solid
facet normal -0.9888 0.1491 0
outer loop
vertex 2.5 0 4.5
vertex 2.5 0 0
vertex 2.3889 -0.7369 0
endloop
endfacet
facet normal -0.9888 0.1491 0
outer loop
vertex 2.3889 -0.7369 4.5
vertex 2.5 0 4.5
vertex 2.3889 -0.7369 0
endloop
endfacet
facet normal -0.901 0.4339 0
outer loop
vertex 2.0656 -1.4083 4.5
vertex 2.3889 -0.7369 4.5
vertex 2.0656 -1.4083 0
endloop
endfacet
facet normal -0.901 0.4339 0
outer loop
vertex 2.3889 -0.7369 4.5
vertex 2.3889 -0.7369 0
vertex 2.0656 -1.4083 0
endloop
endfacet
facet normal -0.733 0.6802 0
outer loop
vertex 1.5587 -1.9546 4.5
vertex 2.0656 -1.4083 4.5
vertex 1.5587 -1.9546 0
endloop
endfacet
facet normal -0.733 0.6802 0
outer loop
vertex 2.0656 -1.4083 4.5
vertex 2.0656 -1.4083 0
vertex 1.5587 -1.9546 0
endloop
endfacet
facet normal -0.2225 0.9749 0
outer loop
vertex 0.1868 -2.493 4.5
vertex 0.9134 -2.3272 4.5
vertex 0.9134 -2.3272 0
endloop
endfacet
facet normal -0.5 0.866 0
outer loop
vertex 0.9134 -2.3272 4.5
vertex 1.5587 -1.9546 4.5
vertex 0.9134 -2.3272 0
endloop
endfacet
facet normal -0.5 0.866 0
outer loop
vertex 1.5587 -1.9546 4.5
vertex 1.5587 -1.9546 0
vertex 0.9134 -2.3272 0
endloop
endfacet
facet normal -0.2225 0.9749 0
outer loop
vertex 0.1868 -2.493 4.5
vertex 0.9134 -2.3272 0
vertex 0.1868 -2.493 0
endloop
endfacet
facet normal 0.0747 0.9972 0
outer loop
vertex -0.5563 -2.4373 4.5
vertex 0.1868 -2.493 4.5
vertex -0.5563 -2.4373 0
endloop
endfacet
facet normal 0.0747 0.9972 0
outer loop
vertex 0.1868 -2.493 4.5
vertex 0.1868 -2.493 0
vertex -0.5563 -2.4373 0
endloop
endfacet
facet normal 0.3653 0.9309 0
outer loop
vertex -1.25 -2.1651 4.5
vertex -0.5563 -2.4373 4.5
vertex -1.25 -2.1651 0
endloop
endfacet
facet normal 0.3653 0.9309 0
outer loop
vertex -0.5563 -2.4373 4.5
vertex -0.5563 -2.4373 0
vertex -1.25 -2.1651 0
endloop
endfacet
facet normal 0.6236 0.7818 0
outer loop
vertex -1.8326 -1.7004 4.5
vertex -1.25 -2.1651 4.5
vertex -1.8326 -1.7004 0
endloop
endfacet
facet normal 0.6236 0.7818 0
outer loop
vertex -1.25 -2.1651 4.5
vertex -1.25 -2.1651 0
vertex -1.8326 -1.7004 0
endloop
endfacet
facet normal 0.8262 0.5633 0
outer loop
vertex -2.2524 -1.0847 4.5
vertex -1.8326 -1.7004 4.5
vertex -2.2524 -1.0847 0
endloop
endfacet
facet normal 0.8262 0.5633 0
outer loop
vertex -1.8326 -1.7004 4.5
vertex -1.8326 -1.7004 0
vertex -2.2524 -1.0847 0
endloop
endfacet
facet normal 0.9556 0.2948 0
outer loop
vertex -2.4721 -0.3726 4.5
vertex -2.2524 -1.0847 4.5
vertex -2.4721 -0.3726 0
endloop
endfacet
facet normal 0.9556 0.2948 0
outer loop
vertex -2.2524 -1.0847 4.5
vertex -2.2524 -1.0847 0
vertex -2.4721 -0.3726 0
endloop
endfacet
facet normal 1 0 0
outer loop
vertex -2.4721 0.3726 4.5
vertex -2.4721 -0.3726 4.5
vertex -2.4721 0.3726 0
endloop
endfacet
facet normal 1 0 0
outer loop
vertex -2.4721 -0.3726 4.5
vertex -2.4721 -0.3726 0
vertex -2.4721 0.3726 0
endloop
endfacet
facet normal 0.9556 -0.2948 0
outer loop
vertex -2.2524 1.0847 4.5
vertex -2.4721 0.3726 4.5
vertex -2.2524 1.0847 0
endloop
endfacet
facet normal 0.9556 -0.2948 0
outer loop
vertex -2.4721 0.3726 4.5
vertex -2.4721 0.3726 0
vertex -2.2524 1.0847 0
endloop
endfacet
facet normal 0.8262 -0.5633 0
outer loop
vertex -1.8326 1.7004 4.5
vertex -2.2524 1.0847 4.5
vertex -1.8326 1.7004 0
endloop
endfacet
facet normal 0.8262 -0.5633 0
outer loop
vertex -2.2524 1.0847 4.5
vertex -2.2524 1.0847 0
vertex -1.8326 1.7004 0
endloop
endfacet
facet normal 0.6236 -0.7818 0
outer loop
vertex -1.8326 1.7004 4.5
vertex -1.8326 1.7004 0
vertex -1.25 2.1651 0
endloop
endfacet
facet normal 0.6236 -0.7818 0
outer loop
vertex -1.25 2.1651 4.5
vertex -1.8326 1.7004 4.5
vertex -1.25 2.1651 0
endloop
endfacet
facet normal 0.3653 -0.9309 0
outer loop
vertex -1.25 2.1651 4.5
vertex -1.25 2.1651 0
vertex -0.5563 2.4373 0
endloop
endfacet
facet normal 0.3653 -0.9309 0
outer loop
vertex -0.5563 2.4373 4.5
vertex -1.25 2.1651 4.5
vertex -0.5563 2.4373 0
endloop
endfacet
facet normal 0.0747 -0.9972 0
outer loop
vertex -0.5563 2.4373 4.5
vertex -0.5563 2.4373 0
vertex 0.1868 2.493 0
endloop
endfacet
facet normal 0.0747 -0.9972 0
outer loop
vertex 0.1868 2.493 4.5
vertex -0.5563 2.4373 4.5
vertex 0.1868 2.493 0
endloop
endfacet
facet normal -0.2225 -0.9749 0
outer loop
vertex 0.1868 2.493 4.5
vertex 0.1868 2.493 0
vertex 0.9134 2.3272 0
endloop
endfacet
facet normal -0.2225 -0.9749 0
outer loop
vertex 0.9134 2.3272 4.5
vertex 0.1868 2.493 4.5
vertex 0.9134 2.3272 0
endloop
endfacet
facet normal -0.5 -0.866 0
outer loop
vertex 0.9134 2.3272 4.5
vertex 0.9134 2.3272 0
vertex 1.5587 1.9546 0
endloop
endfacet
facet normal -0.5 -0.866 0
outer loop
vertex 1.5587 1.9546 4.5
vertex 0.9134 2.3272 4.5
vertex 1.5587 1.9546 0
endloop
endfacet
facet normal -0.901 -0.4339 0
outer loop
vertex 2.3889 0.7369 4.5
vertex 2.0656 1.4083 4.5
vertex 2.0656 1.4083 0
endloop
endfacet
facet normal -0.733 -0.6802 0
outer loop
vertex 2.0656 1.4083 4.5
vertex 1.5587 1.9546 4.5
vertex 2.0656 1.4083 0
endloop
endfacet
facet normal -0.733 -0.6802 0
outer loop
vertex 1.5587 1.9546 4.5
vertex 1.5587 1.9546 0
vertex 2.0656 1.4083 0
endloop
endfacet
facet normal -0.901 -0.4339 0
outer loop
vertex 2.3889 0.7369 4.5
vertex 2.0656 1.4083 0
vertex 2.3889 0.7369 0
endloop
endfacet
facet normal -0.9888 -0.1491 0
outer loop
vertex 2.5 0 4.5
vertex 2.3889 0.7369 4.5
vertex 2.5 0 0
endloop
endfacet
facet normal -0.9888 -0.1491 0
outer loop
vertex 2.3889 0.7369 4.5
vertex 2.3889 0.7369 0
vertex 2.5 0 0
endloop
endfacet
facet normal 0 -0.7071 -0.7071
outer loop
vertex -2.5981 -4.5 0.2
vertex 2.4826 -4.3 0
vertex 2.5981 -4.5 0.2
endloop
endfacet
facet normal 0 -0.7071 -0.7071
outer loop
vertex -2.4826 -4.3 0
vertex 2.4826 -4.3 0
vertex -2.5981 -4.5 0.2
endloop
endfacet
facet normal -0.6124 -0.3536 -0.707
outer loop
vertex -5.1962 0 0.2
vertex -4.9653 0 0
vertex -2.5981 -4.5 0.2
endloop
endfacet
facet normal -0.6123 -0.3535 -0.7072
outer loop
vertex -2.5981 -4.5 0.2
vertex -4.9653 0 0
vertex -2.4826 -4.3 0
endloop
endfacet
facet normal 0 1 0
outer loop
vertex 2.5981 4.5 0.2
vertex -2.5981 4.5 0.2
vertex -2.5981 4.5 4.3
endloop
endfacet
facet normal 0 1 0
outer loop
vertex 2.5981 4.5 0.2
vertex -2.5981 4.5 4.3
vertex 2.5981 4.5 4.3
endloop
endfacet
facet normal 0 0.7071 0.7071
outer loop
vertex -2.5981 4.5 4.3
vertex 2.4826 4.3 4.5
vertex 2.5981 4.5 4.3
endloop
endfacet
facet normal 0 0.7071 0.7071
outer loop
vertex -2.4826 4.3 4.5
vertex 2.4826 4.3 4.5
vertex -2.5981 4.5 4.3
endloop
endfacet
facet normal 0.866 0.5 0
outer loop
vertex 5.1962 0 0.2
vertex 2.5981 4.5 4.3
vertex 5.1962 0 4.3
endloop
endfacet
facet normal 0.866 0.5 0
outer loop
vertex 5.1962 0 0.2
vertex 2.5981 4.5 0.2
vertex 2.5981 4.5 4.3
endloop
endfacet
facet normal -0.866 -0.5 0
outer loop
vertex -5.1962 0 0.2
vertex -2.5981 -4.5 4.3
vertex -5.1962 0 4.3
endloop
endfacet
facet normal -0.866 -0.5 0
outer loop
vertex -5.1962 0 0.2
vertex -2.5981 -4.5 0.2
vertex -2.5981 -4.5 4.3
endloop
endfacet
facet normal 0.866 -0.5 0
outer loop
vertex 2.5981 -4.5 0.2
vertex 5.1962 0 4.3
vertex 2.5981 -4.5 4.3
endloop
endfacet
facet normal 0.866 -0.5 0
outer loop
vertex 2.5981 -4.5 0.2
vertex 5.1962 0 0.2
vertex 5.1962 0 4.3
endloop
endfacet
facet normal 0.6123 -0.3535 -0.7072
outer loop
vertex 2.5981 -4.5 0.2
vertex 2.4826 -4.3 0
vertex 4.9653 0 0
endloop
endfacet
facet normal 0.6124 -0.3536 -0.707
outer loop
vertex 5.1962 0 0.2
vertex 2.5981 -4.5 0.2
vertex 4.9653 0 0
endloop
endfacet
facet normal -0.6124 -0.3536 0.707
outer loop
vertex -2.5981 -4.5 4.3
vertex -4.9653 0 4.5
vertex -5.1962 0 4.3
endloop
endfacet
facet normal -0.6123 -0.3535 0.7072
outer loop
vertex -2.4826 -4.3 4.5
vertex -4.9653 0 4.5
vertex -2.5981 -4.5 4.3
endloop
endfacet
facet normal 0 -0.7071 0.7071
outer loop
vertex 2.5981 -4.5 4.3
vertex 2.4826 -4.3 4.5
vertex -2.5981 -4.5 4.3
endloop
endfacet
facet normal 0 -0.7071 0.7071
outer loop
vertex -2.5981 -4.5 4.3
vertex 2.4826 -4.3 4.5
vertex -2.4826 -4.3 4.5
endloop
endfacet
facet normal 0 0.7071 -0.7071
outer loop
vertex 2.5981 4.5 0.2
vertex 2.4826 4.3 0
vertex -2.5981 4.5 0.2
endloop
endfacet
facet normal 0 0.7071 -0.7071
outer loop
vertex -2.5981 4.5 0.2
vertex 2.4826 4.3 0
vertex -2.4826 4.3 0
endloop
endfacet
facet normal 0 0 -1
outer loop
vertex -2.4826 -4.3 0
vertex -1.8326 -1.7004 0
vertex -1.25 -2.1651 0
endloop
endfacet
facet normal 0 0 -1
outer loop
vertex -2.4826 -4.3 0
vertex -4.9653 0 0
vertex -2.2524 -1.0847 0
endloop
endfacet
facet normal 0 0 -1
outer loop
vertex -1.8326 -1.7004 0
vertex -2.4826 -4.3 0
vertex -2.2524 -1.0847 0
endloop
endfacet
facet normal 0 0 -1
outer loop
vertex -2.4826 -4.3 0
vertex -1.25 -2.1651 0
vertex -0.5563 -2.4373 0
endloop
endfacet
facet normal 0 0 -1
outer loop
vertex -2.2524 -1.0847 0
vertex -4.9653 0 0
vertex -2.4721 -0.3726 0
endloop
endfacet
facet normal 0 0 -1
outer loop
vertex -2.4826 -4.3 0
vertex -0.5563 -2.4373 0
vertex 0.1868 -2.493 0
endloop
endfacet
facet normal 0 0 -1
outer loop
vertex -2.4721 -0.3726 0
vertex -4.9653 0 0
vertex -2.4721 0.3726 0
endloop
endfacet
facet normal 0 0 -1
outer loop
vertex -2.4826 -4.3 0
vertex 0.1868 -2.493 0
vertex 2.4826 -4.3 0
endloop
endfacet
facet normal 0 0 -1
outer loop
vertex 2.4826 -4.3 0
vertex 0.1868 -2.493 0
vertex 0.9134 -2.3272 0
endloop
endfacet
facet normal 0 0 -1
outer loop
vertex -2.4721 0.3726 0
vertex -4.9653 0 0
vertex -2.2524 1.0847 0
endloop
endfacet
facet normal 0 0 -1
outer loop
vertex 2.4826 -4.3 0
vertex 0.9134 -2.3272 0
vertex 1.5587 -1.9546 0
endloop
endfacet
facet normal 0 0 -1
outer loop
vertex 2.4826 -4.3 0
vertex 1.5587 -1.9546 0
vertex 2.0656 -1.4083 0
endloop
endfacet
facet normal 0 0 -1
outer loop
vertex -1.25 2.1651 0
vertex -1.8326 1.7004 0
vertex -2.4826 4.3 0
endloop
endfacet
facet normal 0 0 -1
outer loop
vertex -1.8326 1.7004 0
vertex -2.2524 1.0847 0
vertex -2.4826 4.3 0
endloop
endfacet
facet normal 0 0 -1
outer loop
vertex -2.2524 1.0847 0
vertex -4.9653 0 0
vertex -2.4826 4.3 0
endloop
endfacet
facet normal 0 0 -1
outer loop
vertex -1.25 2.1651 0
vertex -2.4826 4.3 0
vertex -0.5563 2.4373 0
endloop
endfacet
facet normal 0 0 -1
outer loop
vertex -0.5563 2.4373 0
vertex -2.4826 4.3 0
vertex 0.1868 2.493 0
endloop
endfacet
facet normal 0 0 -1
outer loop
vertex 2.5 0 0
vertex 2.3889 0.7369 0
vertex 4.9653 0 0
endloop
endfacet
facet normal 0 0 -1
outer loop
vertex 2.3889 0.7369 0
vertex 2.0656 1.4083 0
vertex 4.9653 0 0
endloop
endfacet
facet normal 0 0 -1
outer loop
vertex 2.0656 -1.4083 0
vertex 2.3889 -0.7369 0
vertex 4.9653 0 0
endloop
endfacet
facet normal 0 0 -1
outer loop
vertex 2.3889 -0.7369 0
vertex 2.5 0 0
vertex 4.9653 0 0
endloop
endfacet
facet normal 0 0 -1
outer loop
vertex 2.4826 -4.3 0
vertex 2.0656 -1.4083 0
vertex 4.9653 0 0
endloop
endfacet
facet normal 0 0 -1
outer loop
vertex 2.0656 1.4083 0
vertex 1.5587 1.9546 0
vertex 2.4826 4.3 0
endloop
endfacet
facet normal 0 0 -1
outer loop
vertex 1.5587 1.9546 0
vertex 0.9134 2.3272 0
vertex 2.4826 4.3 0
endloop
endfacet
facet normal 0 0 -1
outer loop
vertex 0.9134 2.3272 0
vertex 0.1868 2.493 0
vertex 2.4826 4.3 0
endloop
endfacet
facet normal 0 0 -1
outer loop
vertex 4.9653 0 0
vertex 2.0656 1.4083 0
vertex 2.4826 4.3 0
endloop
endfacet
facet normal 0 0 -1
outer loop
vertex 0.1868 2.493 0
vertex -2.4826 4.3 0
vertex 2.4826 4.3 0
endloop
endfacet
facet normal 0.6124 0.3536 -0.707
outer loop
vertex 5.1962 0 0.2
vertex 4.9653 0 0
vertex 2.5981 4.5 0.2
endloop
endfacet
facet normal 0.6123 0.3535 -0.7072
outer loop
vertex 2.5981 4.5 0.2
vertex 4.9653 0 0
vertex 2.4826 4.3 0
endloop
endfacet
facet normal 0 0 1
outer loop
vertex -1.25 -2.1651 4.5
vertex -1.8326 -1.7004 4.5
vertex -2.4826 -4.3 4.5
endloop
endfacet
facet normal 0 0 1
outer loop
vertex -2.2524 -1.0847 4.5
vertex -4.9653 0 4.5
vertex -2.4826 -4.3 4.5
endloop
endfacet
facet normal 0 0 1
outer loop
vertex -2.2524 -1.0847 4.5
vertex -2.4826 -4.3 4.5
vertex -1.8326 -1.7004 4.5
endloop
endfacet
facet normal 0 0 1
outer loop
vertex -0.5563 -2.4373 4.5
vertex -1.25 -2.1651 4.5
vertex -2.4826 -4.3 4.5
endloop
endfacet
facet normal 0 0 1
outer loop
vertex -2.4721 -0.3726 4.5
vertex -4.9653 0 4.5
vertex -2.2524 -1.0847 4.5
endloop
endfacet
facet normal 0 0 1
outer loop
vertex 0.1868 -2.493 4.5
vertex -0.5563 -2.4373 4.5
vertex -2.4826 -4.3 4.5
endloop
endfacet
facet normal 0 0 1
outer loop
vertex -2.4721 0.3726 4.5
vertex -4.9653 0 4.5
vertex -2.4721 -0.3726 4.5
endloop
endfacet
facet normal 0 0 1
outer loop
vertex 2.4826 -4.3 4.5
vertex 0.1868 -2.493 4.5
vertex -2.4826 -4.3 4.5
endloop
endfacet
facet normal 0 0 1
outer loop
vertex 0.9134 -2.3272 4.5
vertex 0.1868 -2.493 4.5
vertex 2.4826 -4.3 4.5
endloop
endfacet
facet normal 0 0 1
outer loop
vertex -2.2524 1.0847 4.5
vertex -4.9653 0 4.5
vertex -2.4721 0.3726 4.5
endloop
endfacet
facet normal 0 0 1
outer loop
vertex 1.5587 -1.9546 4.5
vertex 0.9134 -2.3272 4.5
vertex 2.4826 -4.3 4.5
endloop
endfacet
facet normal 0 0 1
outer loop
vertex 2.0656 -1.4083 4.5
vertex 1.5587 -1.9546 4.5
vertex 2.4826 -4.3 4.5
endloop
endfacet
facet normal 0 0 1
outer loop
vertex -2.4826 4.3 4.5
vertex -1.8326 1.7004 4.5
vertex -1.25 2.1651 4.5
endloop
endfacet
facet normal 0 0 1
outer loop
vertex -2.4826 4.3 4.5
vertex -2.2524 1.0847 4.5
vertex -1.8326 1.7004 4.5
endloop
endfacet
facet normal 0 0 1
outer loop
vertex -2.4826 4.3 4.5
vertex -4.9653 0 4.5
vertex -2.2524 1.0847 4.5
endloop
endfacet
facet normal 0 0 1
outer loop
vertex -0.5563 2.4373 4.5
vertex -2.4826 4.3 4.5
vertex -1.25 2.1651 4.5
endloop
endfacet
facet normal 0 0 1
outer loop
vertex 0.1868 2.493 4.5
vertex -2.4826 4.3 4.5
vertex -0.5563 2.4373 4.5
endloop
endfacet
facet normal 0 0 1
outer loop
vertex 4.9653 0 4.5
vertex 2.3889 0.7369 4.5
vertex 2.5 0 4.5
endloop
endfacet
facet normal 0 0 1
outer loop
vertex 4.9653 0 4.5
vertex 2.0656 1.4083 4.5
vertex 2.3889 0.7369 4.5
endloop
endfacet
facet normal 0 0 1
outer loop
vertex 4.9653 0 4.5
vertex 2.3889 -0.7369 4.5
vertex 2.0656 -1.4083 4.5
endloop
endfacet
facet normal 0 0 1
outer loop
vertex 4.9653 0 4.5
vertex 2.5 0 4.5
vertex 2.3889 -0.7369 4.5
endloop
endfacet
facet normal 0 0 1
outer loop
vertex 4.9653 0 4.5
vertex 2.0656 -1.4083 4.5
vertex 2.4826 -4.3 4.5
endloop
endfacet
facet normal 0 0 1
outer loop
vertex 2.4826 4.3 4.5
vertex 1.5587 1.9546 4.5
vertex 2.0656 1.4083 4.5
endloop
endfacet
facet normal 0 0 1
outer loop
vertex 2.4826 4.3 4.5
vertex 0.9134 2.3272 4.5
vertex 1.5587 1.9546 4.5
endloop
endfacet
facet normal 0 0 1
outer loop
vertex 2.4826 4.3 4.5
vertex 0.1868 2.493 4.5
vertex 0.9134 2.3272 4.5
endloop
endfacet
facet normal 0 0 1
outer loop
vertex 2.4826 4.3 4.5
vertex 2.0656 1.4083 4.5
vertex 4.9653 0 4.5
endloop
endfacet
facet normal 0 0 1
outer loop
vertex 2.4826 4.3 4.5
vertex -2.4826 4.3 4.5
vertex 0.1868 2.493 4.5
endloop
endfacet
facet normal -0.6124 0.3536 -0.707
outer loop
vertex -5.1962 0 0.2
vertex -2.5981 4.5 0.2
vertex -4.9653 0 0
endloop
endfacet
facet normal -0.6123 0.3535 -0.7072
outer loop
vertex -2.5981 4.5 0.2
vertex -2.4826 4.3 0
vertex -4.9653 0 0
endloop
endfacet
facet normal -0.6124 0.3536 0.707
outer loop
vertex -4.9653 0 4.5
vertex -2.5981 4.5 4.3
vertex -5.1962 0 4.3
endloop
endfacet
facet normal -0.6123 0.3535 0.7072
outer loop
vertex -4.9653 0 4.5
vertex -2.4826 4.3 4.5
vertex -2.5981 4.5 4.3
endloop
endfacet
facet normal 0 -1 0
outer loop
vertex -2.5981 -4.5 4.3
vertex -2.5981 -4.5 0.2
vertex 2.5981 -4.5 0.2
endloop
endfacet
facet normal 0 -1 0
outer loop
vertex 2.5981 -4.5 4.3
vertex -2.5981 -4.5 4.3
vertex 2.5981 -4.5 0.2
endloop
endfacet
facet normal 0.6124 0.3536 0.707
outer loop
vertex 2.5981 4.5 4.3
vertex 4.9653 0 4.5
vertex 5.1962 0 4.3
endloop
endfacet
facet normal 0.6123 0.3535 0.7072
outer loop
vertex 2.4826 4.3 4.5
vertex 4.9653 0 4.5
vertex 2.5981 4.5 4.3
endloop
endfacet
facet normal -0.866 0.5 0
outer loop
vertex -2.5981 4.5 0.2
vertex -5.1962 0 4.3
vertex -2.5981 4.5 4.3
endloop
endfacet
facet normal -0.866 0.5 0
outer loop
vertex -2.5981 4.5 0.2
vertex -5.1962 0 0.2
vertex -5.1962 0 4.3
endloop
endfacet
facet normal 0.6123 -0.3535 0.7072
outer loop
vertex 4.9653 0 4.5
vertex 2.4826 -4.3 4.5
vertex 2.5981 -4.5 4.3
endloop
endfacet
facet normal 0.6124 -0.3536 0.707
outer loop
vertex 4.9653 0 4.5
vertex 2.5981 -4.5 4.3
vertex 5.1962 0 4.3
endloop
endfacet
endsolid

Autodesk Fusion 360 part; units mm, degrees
sketch "Sketch1" plane through (0, 0, 0) normal (0, 0, 1) x (1, 0, 0)
  circle A0 centre (0, 0) radius 2.5
  line L0 (0, 0) -> (5, 8.6603) construction
  line L1 (0, 0) -> (5, -8.6603) construction
  line L2 (0, 0) -> (-5, -8.6603) construction
  line L3 (0, 0) -> (-5, 8.6603) construction
  line L4 (10, 0) -> (-10, 0) construction
  line L5 (2.5981, 4.5) -> (5.1962, 0)
  line L6 (5.1962, 0) -> (2.5981, -4.5)
  line L7 (-2.5981, -4.5) -> (-5.1962, 0)
  line L8 (-5.1962, 0) -> (-2.5981, 4.5)
  line L9 (-2.5981, -4.5) -> (2.5981, -4.5)
  line L10 (-2.5981, 4.5) -> (2.5981, 4.5)
  dimension "d1" = 5
extrude "Extrude1" add sketch "Sketch1" along normal blind 4.5
chamfer "Chamfer1" distance 0.2 angle 45 12 edges at (0, -4.5, 4.5) (-3.8971, -2.25, 4.5) (-3.8971, 2.25, 4.5) (0, 4.5, 4.5) (3.8971, 2.25, 4.5) (3.8971, -2.25, 4.5) (0, -4.5, 0) (-3.8971, -2.25, 0) (-3.8971, 2.25, 0) (0, 4.5, 0) (3.8971, 2.25, 0) (3.8971, -2.25, 0)
